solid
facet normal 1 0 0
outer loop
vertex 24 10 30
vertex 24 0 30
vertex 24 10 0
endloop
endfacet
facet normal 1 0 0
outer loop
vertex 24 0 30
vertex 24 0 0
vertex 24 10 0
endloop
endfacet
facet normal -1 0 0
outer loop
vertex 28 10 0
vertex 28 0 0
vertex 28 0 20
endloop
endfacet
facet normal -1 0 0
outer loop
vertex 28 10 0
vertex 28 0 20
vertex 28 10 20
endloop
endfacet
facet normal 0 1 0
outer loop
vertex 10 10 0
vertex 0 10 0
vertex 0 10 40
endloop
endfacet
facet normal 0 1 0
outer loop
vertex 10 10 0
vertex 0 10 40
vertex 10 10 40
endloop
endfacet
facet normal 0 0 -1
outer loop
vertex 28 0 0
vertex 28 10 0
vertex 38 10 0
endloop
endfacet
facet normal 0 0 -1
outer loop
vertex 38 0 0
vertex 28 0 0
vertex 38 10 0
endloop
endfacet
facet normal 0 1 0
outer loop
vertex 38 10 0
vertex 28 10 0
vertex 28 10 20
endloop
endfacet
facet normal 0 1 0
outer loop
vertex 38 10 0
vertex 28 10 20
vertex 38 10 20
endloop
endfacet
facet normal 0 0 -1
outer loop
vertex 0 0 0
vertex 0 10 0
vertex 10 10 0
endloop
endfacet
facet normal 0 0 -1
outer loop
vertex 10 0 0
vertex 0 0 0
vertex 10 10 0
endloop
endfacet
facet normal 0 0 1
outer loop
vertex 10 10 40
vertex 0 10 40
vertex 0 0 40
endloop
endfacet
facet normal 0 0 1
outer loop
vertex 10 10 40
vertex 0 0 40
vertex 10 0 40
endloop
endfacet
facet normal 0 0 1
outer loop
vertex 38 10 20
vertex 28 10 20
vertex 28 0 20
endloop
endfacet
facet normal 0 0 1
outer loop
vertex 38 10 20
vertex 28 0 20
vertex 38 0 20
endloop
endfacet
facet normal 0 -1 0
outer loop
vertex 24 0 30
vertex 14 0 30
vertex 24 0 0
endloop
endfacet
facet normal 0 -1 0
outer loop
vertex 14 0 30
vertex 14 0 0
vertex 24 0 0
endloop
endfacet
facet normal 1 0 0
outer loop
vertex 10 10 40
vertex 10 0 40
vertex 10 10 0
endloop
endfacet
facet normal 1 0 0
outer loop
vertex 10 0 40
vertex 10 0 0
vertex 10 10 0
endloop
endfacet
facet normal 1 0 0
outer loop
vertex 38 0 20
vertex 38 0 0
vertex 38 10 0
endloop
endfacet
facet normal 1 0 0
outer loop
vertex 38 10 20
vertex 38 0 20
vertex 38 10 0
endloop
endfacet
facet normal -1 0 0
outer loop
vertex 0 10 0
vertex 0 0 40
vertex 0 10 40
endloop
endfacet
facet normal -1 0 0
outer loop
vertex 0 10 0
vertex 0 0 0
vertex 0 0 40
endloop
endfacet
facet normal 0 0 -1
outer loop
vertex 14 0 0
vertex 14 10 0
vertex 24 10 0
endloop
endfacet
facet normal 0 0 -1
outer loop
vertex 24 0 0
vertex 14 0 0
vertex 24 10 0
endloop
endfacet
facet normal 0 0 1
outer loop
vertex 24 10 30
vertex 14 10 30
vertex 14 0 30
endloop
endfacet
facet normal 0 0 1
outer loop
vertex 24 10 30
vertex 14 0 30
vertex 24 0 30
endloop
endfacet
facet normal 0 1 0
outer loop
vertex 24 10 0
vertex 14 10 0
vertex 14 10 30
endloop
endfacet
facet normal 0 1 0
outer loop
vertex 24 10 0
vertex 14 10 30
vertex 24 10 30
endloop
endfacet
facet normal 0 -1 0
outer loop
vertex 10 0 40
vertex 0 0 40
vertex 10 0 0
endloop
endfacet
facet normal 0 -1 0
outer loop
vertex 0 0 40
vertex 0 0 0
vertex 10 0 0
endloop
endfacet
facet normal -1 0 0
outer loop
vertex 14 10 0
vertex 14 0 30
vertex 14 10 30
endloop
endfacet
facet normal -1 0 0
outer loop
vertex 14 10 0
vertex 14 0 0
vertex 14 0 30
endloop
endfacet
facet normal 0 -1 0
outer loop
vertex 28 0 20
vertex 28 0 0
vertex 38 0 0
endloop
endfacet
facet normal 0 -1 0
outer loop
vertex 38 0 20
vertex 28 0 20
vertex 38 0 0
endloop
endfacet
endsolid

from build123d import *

# Parameters (mm, degrees)
BOX003_W     = 10
BOX003_H     = 10
BOX003_DEPTH = 10
BOX001_W     = 10
BOX001_H     = 10
BOX001_DEPTH = 10
BOX002_W     = 10
BOX002_H     = 10
BOX002_DEPTH = 10
BOX_W        = 10
BOX_H        = 10
BOX_DEPTH    = 10
BOX006_W     = 10
BOX006_H     = 10
BOX006_DEPTH = 10
BOX005_W     = 10
BOX005_H     = 10
BOX005_DEPTH = 10
BOX004_W     = 10
BOX004_H     = 10
BOX004_DEPTH = 10
BOX007_W     = 10
BOX007_H     = 10
BOX007_DEPTH = 10
BOX008_W     = 10
BOX008_H     = 10
BOX008_DEPTH = 10


with BuildPart() as cube003:
    # Box003 → Box003 (new body)
    with BuildSketch(Plane.XY.offset(30)):
        with Locations((5, 5)):
            Rectangle(BOX003_W, BOX003_H)
    extrude(amount=BOX003_DEPTH)


with BuildPart() as cube001:
    # Box001 → Box001 (new body)
    with BuildSketch(Plane.XY.offset(10)):
        with Locations((5, 5)):
            Rectangle(BOX001_W, BOX001_H)
    extrude(amount=BOX001_DEPTH)


with BuildPart() as cube002:
    # Box002 → Box002 (new body)
    with BuildSketch(Plane.XY.offset(20)):
        with Locations((5, 5)):
            Rectangle(BOX002_W, BOX002_H)
    extrude(amount=BOX002_DEPTH)


with BuildPart() as fusion:
    # Box → Box (new body)
    with BuildSketch(Plane.XY):
        with Locations((5, 5)):
            Rectangle(BOX_W, BOX_H)
    extrude(amount=BOX_DEPTH)

    # Fusion: union Cube003, Cube001, Cube002
    add(cube003.part)
    add(cube001.part)
    add(cube002.part)


with BuildPart() as cube006:
    # Box006 → Box006 (new body)
    with BuildSketch(Plane(origin=(14, 0, 20), x_dir=(1, 0, 0), z_dir=(0, 0, 1))):
        with Locations((5, 5)):
            Rectangle(BOX006_W, BOX006_H)
    extrude(amount=BOX006_DEPTH)


with BuildPart() as cube005:
    # Box005 → Box005 (new body)
    with BuildSketch(Plane(origin=(14, 0, 10), x_dir=(1, 0, 0), z_dir=(0, 0, 1))):
        with Locations((5, 5)):
            Rectangle(BOX005_W, BOX005_H)
    extrude(amount=BOX005_DEPTH)


with BuildPart() as fusion001:
    # Box004 → Box004 (new body)
    with BuildSketch(Plane(origin=(14, 0, 0), x_dir=(1, 0, 0), z_dir=(0, 0, 1))):
        with Locations((5, 5)):
            Rectangle(BOX004_W, BOX004_H)
    extrude(amount=BOX004_DEPTH)

    # Fusion001: union Cube006, Cube005
    add(cube006.part)
    add(cube005.part)


with BuildPart() as cube007:
    # Box007 → Box007 (new body)
    with BuildSketch(Plane(origin=(28, 0, 0), x_dir=(1, 0, 0), z_dir=(0, 0, 1))):
        with Locations((5, 5)):
            Rectangle(BOX007_W, BOX007_H)
    extrude(amount=BOX007_DEPTH)


with BuildPart() as fusion002:
    # Box008 → Box008 (new body)
    with BuildSketch(Plane(origin=(28, 0, 10), x_dir=(1, 0, 0), z_dir=(0, 0, 1))):
        with Locations((5, 5)):
            Rectangle(BOX008_W, BOX008_H)
    extrude(amount=BOX008_DEPTH)

    # Fusion002: union Cube007
    add(cube007.part)


solid = Compound([fusion.part, fusion001.part, fusion002.part])
